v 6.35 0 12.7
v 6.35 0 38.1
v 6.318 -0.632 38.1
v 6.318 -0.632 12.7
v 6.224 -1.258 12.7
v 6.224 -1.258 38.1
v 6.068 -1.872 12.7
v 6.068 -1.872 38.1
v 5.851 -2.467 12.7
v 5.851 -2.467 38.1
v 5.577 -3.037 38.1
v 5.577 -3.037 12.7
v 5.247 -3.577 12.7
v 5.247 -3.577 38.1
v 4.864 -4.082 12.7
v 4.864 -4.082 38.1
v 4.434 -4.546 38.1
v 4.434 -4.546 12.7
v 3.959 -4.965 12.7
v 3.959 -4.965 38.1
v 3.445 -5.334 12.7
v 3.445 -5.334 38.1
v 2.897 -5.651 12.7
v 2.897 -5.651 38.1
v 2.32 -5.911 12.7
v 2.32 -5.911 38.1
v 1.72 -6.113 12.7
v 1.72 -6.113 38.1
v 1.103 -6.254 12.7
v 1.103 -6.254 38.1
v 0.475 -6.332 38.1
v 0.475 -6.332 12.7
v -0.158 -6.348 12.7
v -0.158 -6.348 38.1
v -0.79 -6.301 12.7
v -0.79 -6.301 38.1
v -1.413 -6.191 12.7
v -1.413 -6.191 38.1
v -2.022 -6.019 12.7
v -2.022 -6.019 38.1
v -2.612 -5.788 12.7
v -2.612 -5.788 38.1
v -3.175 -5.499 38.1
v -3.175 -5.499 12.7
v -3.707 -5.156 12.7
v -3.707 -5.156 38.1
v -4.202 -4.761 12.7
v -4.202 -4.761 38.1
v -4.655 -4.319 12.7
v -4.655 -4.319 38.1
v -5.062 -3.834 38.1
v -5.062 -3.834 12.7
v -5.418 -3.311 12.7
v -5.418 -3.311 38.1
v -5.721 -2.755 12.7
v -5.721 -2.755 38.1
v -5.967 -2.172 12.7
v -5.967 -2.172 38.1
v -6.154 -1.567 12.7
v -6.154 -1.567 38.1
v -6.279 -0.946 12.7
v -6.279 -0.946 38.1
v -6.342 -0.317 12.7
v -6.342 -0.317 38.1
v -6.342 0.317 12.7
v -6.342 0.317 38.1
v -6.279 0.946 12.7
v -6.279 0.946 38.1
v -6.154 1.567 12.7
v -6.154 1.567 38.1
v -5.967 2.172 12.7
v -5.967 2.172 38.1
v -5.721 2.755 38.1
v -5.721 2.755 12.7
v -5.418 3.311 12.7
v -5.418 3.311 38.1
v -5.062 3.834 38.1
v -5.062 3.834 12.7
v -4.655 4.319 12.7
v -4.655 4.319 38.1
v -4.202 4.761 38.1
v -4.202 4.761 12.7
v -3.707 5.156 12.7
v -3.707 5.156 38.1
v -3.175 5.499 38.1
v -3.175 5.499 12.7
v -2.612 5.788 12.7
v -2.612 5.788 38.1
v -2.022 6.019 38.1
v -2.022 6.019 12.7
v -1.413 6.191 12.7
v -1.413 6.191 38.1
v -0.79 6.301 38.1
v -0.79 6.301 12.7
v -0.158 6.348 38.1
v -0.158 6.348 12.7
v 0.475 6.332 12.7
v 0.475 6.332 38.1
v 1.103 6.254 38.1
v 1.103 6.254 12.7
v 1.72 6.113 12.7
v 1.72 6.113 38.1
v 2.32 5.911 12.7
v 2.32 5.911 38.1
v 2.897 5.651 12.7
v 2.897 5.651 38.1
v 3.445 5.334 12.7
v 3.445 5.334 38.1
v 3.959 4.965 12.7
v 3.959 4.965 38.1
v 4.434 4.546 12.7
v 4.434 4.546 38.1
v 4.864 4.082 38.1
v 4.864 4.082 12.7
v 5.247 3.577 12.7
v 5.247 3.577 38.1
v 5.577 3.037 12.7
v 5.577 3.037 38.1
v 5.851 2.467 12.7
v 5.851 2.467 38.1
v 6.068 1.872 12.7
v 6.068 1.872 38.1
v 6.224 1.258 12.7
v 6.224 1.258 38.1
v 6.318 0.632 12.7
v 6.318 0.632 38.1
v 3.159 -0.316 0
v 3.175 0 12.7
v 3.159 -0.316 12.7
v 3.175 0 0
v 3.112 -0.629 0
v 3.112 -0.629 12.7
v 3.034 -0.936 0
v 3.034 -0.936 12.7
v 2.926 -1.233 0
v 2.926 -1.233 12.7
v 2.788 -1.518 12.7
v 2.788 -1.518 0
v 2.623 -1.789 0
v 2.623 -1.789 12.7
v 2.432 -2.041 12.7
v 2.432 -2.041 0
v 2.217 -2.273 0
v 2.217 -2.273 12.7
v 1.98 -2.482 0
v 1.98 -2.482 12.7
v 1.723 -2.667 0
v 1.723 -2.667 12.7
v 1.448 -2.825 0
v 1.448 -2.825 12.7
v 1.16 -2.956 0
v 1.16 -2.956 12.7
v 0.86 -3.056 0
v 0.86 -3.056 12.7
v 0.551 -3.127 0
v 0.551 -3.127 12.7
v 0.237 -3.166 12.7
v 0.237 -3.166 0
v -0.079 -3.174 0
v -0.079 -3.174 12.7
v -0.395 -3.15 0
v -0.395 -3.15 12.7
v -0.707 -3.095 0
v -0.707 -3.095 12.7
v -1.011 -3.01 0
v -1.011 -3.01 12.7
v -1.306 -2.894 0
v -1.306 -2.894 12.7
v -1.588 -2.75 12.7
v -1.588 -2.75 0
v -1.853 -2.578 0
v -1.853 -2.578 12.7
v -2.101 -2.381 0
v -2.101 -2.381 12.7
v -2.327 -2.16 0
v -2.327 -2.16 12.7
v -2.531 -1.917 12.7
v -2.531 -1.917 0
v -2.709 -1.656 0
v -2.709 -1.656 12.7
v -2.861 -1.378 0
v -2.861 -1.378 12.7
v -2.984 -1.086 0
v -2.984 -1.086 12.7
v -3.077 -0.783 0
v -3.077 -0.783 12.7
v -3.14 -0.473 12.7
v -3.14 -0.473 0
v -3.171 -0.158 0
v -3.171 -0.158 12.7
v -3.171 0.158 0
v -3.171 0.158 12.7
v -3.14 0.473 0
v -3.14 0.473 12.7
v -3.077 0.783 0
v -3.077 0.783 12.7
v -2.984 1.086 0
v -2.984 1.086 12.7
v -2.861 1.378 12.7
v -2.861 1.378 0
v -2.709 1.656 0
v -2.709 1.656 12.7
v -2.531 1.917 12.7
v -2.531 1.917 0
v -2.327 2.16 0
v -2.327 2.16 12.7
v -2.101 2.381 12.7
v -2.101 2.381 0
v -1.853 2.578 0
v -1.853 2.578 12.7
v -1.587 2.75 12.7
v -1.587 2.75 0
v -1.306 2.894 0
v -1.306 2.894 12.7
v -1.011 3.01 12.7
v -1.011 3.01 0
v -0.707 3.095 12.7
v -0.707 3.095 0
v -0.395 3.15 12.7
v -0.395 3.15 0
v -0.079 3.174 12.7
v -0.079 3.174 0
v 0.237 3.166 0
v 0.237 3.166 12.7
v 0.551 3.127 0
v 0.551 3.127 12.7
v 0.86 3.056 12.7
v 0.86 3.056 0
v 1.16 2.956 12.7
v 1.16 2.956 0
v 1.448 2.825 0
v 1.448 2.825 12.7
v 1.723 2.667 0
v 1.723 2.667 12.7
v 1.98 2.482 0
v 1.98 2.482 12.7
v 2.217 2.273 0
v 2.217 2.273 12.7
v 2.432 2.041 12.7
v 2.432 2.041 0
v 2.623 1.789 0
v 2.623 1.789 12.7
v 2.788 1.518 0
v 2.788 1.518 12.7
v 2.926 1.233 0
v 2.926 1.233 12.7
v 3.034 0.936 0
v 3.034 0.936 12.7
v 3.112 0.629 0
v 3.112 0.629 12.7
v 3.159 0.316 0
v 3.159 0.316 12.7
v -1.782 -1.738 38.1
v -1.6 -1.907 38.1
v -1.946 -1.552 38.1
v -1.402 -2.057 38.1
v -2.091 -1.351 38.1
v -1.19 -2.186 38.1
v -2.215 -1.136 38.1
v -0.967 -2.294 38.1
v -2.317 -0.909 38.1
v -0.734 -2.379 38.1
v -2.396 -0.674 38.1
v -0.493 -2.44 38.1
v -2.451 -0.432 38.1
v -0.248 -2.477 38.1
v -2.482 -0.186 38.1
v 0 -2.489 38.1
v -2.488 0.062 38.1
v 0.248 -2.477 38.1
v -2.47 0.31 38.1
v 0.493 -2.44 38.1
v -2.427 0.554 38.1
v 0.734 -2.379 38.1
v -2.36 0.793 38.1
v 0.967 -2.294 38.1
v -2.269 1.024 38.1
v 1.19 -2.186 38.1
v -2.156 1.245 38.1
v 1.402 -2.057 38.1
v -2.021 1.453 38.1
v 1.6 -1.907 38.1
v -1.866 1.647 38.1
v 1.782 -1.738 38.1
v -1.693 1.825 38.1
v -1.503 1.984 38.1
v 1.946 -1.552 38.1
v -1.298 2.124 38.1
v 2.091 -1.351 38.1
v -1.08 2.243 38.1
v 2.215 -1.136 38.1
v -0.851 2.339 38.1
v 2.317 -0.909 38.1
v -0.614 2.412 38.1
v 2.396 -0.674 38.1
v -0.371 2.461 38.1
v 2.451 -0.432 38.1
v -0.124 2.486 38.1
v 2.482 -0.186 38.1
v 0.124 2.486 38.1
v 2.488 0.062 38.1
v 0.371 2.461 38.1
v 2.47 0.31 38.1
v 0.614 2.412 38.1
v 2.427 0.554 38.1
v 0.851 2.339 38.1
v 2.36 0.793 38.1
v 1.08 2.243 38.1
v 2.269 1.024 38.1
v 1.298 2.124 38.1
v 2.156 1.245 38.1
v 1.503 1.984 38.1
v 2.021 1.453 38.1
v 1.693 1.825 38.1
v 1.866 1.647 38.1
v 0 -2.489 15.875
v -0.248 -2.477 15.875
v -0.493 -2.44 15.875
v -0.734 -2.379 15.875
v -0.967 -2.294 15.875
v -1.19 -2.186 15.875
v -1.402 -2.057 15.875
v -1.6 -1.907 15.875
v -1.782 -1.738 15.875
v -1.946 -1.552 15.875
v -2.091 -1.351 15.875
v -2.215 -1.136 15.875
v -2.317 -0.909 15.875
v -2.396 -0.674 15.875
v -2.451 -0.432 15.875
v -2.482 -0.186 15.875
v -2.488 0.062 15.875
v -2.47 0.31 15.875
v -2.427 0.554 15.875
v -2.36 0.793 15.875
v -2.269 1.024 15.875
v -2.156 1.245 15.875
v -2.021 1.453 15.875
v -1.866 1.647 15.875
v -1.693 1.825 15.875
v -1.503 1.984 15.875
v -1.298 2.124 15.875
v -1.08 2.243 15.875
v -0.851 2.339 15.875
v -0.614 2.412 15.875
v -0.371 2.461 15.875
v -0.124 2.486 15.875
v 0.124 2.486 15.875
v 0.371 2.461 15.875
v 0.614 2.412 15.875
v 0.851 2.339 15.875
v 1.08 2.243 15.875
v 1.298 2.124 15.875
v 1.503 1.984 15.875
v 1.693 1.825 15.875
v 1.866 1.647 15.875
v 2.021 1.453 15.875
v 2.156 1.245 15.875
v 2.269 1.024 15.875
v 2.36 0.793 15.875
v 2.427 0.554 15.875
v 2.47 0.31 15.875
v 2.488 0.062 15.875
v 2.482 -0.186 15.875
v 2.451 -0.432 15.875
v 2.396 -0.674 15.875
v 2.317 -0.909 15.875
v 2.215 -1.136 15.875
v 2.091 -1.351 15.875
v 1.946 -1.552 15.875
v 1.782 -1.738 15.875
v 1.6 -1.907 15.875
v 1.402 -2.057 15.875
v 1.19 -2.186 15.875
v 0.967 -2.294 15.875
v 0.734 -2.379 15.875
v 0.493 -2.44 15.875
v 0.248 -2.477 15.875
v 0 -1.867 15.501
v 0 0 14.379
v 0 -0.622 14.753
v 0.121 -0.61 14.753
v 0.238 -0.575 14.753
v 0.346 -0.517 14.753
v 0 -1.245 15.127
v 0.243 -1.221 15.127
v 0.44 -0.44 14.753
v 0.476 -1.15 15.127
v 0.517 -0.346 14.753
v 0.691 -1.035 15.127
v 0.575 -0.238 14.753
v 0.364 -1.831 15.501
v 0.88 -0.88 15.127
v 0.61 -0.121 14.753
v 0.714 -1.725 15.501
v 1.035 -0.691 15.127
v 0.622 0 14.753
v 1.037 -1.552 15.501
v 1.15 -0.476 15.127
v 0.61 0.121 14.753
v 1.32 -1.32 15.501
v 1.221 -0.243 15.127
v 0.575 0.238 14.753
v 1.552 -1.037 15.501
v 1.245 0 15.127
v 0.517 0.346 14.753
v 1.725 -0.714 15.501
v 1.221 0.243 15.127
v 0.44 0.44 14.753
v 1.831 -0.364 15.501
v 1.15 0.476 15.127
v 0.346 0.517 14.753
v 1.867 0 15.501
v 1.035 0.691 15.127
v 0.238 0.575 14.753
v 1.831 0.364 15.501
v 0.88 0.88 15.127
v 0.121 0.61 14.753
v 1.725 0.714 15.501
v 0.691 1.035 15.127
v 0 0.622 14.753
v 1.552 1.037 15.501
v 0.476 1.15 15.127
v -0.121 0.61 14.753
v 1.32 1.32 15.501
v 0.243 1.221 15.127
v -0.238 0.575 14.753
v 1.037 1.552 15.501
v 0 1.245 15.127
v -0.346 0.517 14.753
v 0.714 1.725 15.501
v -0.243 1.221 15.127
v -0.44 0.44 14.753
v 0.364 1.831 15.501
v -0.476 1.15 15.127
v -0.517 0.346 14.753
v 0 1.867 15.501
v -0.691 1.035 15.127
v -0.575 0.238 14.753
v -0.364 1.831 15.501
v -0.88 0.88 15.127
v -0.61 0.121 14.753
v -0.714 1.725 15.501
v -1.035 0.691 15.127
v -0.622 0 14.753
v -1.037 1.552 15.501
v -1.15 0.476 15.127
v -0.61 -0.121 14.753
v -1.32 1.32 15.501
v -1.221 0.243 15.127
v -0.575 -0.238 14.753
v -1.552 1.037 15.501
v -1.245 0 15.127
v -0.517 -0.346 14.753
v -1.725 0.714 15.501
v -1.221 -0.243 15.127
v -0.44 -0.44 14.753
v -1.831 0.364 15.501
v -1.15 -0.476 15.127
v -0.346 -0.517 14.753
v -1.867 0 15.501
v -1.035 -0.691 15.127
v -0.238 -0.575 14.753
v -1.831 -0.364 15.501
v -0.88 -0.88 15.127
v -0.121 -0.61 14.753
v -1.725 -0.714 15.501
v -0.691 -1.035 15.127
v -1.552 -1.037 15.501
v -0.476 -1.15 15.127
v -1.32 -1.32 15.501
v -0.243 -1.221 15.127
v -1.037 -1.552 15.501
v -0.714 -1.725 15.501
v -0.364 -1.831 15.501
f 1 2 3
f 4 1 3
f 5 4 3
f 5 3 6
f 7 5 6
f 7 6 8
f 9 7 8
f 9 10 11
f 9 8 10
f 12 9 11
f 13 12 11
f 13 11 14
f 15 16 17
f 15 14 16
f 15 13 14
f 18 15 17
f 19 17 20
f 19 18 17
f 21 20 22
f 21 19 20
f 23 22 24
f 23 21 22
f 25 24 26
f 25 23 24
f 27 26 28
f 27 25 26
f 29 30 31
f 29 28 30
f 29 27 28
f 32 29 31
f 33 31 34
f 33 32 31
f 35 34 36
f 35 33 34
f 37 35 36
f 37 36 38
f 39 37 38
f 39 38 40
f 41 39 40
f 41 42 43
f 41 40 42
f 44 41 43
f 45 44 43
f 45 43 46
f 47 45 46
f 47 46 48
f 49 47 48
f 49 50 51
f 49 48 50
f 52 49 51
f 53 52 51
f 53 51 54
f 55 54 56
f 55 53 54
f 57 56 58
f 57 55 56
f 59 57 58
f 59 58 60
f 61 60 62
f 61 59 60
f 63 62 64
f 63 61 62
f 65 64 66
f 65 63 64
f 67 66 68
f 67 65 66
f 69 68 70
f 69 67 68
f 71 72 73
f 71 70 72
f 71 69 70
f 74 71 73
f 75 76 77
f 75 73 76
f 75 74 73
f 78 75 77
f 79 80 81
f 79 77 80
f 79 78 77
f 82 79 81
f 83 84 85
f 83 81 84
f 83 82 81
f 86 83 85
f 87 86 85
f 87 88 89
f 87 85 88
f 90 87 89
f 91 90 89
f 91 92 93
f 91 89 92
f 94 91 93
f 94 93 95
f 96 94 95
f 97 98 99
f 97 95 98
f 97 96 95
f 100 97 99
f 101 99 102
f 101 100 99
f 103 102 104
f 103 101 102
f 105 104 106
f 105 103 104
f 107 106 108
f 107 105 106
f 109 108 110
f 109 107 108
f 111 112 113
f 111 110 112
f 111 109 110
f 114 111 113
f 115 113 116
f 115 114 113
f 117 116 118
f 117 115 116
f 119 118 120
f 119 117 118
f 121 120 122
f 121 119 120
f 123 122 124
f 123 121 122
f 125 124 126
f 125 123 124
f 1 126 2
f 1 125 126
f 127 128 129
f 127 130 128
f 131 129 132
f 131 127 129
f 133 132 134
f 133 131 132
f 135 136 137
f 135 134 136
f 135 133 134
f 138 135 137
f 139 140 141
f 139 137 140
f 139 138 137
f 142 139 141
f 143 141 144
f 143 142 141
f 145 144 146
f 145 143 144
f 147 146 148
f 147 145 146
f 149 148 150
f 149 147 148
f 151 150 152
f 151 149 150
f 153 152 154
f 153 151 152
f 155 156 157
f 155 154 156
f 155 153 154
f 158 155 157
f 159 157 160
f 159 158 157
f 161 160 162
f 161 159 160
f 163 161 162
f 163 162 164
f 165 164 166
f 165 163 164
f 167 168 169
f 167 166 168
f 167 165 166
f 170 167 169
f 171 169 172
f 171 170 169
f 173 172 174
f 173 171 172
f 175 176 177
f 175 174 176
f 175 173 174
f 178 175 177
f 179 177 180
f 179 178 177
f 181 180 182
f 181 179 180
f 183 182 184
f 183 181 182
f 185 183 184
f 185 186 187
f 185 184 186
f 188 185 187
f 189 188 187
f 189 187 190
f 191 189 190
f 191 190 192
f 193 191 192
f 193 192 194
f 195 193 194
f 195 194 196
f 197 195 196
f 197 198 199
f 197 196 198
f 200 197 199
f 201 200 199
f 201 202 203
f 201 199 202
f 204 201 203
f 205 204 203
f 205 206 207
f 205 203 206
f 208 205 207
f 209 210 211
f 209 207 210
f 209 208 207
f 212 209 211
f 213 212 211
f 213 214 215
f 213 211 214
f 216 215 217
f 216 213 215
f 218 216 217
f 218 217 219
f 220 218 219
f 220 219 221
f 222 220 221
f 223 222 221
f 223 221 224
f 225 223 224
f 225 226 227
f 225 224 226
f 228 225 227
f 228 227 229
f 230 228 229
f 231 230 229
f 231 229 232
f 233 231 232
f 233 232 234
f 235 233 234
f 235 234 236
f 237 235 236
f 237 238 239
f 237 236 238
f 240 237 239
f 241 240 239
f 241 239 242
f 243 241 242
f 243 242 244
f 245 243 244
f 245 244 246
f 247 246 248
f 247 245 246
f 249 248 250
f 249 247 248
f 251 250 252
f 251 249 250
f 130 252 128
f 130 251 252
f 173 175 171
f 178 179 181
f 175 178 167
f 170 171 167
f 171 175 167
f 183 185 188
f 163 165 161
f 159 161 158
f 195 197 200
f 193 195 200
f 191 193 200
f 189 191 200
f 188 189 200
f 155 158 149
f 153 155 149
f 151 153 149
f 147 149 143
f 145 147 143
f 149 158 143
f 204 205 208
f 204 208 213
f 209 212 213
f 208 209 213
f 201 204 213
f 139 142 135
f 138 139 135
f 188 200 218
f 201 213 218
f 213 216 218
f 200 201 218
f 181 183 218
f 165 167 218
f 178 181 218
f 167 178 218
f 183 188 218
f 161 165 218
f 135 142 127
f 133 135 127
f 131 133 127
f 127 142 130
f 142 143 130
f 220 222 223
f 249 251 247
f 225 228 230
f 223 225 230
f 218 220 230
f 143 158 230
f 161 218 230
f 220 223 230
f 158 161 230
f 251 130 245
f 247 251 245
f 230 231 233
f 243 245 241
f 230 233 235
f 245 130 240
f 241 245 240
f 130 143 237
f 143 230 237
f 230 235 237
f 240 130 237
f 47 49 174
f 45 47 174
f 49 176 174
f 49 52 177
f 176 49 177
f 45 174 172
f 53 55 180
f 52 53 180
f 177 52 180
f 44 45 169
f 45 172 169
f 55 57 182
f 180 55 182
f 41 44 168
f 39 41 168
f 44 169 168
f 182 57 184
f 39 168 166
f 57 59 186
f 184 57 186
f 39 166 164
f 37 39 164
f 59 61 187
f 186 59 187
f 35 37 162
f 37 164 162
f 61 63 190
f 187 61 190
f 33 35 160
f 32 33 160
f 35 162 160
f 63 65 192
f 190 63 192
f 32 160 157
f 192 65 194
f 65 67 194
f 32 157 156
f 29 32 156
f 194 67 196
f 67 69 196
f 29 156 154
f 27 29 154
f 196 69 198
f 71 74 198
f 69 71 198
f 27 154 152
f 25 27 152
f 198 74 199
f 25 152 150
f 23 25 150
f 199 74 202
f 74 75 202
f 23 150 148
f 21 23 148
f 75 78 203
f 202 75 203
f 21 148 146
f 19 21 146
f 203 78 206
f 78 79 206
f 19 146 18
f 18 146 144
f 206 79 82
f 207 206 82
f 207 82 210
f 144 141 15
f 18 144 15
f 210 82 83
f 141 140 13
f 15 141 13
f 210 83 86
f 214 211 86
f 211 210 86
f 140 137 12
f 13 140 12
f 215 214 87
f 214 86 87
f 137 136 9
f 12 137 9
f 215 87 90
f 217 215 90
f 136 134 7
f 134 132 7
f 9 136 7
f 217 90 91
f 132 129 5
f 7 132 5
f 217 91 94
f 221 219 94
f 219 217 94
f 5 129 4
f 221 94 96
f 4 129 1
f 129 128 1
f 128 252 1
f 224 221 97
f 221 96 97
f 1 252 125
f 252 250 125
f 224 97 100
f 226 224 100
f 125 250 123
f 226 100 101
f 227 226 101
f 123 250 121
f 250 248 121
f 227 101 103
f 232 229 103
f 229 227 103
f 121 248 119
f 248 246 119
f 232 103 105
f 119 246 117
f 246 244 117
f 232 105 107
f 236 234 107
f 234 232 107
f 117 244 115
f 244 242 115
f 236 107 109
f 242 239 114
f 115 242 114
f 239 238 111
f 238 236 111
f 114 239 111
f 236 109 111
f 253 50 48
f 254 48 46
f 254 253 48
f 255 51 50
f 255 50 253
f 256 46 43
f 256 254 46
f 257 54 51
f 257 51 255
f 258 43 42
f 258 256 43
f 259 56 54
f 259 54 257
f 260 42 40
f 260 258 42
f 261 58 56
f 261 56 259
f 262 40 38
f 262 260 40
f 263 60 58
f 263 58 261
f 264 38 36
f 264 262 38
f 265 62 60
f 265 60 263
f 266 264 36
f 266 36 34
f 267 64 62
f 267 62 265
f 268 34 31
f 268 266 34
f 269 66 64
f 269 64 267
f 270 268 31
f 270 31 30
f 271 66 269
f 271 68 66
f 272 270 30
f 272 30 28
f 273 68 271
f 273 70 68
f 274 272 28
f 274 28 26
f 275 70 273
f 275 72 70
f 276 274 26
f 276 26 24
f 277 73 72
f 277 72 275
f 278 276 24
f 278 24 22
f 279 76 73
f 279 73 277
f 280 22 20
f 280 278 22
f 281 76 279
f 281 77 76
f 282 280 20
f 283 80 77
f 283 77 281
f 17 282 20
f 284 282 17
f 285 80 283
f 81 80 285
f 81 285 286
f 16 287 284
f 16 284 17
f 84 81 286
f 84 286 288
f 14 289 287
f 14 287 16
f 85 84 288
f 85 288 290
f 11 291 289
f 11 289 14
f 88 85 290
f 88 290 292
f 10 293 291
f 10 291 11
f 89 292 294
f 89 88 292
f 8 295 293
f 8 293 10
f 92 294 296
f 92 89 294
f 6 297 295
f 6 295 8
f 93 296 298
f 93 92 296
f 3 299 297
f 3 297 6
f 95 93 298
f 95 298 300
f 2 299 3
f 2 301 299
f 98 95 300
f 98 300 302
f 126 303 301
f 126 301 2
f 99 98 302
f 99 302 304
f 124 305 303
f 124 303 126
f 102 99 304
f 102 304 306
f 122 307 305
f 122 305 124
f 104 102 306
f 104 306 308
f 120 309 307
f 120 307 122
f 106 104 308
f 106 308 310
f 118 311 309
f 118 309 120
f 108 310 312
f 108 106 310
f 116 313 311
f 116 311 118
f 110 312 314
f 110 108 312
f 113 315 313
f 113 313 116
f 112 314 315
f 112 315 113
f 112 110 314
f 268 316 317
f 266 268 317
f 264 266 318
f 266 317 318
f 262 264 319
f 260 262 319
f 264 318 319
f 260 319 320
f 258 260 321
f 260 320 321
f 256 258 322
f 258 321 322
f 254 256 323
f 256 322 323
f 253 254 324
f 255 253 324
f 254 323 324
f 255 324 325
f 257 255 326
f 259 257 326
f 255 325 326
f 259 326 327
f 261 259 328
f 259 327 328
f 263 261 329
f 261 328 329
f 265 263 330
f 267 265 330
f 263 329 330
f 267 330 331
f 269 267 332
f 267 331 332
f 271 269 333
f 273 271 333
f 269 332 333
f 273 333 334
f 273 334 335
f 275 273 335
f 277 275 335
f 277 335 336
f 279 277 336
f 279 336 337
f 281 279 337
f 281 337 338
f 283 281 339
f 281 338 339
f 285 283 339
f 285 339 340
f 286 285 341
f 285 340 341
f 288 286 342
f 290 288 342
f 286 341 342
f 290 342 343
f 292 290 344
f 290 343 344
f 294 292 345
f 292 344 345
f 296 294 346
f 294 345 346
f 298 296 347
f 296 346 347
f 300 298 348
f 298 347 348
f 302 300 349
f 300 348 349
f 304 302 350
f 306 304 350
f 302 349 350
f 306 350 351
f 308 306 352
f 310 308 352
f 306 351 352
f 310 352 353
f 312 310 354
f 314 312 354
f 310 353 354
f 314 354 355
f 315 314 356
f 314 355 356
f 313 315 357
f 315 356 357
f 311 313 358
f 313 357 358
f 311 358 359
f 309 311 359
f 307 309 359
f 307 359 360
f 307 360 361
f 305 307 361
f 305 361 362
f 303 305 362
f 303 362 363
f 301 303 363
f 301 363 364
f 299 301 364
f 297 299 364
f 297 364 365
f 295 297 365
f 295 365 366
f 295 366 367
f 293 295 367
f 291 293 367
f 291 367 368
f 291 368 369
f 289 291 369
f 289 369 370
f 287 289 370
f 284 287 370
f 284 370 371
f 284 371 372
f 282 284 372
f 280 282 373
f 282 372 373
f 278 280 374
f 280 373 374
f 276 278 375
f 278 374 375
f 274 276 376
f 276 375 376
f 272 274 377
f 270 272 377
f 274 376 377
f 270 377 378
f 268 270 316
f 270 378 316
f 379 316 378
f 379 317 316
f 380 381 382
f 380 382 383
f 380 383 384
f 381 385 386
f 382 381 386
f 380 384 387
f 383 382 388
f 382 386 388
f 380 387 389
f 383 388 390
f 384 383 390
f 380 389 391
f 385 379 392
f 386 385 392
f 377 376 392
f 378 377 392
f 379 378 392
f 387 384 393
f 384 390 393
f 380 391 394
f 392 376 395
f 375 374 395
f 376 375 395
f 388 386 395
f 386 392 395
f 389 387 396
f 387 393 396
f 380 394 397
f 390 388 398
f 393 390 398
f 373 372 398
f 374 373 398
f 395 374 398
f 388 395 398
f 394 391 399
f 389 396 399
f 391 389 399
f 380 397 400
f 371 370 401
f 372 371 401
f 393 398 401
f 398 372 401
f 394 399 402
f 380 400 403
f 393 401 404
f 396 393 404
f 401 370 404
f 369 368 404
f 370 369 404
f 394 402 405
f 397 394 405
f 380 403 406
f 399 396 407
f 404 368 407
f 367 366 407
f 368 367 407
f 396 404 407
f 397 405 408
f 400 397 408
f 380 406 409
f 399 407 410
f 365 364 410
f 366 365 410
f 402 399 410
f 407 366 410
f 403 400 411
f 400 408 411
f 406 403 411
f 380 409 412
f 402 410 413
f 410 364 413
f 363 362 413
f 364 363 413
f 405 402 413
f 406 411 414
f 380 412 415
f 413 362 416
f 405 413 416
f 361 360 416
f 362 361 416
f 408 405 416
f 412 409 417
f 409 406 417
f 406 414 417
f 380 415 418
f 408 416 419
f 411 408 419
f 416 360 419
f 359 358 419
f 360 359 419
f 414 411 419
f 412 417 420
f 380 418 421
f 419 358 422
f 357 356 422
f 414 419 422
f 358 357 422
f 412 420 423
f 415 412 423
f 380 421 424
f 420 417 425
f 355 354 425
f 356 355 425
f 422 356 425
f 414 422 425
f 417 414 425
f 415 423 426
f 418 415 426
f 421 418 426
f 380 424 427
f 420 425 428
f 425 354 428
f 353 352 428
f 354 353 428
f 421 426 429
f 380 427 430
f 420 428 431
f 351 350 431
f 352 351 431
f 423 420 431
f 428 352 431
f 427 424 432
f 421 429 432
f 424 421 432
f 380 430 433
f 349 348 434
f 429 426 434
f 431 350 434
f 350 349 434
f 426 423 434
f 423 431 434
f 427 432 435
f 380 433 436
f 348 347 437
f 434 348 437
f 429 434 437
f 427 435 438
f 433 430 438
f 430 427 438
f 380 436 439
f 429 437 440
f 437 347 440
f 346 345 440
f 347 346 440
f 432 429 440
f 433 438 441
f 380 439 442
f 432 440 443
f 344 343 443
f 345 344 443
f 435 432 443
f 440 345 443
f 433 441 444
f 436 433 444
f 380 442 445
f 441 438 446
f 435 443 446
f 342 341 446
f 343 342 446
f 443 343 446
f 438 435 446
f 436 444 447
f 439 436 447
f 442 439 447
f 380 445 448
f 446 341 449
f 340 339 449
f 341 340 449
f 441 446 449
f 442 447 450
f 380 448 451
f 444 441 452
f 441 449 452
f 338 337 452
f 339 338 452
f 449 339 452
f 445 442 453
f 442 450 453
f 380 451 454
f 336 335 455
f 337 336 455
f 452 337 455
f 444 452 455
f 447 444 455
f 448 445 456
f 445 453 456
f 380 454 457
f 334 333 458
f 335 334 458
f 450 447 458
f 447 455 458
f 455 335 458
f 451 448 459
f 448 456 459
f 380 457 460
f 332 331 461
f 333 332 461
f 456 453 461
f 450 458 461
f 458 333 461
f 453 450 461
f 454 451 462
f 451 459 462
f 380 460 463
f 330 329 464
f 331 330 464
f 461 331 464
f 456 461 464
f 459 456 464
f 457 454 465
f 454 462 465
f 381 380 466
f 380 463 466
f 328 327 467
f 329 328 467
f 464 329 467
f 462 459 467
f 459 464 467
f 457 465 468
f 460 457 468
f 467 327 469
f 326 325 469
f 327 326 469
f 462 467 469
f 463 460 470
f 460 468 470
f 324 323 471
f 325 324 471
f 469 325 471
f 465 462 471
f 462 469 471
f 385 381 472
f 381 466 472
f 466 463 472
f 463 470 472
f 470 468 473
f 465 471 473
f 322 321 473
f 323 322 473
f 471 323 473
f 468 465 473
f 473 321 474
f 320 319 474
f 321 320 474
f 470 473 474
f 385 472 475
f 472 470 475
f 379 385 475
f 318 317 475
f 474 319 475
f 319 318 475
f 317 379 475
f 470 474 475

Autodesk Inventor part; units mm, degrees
ref_plane "YZ Plane" through (0, 0, 0) normal (1, 0, 0) x (0, 1, 0)
ref_plane "XZ Plane" through (0, 0, 0) normal (0, 1, 0) x (-1, 0, 0)
ref_plane "XY Plane" through (0, 0, 0) normal (0, 0, 1) x (1, 0, 0)
sketch "Sketch1" plane through (0, 0, 0) normal (0, 0, 1) x (1, 0, 0)
  circle A0 centre (0, 0) radius 3.175
  dimension "d0" = 6.35
extrude "Extrusion1" add sketch "Sketch1" along normal blind 12.7
sketch "Sketch2" plane through (0, 0, 12.7) normal (0, 0, 1) x (1, 0, 0)
  circle A0 centre (0, 0) radius 6.35
  dimension "d3" = 12.7
extrude "Extrusion2" add sketch "Sketch2" along normal blind 25.4
sketch "Sketch3" plane through (0, 0, 38.1) normal (0, 0, 1) x (1, 0, 0)
  circle A0 centre (0, 0) radius 6.35 projected
sketch "Sketch4" plane through (0, 0, 38.1) normal (0, 0, 1) x (1, 0, 0)
  point P0 (0, 0)
hole "Hole2" at (0, 0, 38.1) direction (0, 0, -1) diameter 4.9784 depth 22.225 tip angle 118 thread size "1/4-20 UNC" class "2B" standard "ANSI Unified Screw Threads"
properties part number "Pin" material "Aluminum 6061"
